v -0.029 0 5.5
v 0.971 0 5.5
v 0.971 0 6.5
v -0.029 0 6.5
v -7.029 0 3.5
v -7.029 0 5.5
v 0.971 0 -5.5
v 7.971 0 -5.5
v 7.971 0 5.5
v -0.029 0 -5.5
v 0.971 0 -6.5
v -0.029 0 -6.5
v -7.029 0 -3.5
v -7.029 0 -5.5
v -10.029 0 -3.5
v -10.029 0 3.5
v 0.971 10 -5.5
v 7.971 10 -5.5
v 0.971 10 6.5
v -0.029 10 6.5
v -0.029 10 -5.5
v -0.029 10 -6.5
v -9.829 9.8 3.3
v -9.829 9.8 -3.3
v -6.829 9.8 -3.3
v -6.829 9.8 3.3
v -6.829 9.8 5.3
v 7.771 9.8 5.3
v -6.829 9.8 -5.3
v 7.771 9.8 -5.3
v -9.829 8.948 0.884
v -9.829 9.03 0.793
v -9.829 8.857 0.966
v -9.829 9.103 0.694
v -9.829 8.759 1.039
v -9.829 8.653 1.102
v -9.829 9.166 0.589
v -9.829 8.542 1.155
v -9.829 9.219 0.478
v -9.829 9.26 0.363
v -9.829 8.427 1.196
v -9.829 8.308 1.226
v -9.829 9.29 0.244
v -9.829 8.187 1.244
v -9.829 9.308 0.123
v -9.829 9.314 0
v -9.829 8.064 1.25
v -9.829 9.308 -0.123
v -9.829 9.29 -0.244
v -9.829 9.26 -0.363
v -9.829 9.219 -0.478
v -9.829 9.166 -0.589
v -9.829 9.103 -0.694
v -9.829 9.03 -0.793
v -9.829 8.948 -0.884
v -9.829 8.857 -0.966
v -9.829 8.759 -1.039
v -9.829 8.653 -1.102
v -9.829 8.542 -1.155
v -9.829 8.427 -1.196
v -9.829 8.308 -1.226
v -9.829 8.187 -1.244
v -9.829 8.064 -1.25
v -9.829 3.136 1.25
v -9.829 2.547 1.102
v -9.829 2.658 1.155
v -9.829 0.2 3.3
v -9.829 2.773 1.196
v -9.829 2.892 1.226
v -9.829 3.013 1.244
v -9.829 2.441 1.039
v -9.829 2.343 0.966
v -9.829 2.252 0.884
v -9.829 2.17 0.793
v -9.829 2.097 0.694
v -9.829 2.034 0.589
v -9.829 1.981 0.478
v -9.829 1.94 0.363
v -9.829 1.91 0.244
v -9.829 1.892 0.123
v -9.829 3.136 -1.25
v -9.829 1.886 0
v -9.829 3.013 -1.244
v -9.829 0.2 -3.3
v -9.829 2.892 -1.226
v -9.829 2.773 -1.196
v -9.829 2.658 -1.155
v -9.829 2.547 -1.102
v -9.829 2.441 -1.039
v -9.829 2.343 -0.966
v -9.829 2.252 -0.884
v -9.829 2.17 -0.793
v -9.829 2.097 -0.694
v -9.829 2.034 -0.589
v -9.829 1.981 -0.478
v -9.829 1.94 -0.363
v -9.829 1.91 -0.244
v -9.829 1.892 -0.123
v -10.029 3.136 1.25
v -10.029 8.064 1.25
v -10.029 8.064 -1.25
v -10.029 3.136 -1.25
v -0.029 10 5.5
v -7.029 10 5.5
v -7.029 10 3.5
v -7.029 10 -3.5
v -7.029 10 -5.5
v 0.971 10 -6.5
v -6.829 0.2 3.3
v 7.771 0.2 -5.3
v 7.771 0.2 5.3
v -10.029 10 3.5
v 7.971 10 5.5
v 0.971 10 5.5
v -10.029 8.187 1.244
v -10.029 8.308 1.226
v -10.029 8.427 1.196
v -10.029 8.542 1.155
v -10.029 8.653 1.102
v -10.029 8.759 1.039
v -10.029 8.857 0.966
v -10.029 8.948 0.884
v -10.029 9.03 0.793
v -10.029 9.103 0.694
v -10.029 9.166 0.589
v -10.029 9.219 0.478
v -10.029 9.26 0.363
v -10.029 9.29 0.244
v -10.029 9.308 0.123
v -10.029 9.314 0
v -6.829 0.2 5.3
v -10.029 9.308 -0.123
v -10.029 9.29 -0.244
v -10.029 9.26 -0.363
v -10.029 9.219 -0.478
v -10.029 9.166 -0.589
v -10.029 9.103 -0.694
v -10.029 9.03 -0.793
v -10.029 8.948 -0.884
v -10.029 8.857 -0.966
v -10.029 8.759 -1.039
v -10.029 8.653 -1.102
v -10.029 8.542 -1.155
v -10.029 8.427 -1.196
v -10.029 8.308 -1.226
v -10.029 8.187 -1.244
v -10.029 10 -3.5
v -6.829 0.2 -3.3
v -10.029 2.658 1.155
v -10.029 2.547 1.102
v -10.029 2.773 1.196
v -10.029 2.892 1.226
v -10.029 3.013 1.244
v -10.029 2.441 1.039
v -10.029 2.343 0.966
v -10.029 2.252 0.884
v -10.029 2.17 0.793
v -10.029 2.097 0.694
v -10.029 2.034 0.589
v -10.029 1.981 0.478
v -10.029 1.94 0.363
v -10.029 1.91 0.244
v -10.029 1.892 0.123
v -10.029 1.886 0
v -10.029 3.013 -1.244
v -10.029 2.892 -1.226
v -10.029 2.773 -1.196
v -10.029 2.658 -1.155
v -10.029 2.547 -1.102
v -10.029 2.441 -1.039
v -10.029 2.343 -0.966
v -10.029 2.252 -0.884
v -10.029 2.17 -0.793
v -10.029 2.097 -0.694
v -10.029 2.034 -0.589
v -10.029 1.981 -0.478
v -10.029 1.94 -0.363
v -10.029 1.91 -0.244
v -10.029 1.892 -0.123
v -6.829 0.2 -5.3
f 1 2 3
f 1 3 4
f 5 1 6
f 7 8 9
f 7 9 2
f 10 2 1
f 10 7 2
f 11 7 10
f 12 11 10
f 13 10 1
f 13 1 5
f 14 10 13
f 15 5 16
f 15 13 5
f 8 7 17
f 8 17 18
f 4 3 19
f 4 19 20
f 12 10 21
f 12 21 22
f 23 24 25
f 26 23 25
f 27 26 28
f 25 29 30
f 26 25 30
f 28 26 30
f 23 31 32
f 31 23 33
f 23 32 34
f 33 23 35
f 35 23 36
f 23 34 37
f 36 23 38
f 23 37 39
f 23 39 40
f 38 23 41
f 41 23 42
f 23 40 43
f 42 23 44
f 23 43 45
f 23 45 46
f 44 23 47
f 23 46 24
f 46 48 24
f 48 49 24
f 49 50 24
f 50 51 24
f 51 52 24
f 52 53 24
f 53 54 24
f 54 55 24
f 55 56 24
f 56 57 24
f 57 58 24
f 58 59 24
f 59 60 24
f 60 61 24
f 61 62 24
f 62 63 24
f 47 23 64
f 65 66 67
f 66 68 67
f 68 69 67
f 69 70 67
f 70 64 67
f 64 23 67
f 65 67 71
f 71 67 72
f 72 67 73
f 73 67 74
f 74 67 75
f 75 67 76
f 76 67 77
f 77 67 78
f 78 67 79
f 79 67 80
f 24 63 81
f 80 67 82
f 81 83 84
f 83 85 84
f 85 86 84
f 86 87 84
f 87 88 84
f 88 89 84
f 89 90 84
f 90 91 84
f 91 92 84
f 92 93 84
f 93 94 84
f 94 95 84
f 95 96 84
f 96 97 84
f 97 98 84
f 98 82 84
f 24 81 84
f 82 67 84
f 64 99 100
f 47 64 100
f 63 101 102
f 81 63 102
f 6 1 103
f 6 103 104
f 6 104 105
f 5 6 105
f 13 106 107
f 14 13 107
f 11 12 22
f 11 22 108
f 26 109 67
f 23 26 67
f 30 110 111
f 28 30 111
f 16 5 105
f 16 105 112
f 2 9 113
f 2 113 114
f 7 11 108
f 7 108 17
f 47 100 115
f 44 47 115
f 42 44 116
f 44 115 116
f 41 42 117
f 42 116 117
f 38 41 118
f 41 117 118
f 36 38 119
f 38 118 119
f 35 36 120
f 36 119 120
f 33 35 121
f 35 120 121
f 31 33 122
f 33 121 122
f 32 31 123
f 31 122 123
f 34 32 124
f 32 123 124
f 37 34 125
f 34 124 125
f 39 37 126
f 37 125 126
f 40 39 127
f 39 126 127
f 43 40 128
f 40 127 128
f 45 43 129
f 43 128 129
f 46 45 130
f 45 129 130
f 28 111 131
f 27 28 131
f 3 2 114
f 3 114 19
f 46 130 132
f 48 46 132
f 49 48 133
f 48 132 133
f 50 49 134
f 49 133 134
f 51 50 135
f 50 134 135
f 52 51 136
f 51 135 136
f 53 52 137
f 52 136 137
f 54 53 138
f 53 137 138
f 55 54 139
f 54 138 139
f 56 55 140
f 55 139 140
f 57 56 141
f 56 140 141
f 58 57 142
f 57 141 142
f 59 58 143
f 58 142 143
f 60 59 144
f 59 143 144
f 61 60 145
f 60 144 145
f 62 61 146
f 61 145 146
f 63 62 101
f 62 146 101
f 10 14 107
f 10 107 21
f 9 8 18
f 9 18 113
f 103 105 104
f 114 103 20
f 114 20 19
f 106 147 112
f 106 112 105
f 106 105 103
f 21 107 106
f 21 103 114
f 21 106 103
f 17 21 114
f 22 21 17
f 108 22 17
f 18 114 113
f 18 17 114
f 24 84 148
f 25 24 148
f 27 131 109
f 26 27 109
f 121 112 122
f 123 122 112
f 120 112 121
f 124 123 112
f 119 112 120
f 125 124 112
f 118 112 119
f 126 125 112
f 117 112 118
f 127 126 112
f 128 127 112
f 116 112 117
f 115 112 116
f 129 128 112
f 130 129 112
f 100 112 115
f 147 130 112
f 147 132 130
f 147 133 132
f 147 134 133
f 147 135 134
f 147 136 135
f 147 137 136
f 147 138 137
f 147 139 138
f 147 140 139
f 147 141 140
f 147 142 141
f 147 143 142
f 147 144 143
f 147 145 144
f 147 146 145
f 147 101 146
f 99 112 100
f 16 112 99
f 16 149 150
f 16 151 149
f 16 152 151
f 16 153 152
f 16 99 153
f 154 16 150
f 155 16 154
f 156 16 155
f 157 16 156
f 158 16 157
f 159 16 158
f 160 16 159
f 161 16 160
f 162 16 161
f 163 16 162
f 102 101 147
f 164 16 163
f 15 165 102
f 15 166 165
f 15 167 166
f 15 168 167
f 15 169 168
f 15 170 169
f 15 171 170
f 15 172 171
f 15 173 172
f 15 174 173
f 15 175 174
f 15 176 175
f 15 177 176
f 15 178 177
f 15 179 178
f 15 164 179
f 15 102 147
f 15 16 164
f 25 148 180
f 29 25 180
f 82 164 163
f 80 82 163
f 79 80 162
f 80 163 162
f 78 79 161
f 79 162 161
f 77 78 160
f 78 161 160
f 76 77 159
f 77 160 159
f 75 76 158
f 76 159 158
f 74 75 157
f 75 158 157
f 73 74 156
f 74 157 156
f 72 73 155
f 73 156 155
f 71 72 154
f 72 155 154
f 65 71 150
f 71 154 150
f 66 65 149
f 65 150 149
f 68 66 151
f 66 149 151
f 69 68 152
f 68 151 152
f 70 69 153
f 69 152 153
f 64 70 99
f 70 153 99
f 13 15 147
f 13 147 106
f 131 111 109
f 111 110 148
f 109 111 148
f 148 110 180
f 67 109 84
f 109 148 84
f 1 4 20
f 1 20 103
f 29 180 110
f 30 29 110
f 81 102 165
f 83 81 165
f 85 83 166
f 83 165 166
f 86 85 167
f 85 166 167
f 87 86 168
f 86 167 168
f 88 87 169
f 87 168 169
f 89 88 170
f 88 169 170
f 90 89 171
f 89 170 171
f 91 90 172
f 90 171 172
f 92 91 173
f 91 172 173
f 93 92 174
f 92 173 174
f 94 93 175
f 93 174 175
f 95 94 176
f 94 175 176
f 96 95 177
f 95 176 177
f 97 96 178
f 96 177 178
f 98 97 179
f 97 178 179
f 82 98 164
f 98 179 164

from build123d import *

# Parameters (mm, degrees)
BOSS_EXTRUDE1_DEPTH = 10
SKETCH6_W           = 14.6
SKETCH6_H           = 10.6
SKETCH6_W_2         = 3
SKETCH6_H_2         = 6.6
BOSS_EXTRUDE4_DEPTH = 0.2
SKETCH7_W           = 14.6
SKETCH7_H           = 10.6
SKETCH7_W_2         = 3
SKETCH7_H_2         = 6.6
BOSS_EXTRUDE5_DEPTH = 0.2
CUT_EXTRUDE3_DEPTH  = 0.5


with BuildPart() as part:
    # Sketch1 → Boss-Extrude1 (new body)
    with BuildSketch(Plane(origin=(0, 0, 0), x_dir=(1, 0, 0), z_dir=(0, 1, 0))):
        Polygon((-10.028718685, -3.5), (-10.028718685, 3.5), (-7.028718685, 3.5), (-7.028718685, 5.5), (-0.028718685, 5.5), (-0.028718685, 6.5), (0.971281315, 6.5), (0.971281315, 5.5), (7.971281315, 5.5), (7.971281315, -5.5), (0.971281315, -5.5), (0.971281315, -6.5), (-0.028718685, -6.5), (-0.028718685, -5.5), (-7.028718685, -5.5), (-7.028718685, -3.5), align=None)
        Polygon((-9.828718685, 3.3), (-6.828718685, 3.3), (-6.828718685, 5.3), (0.171281315, 5.3), (0.771281315, 5.3), (7.771281315, 5.3), (7.771281315, -5.3), (0.771281315, -5.3), (0.171281315, -5.3), (-6.828718685, -5.3), (-6.828718685, -3.3), (-9.828718685, -3.3), align=None, mode=Mode.SUBTRACT)
    extrude(amount=BOSS_EXTRUDE1_DEPTH)

    # Sketch6 → Boss-Extrude4 (add)
    with BuildSketch(Plane(origin=(0, 0, 0), x_dir=(-1, 0, 0), z_dir=(0, -1, 0))):
        with Locations((-0.471281315, 0)):
            Rectangle(SKETCH6_W, SKETCH6_H)
        with Locations((8.328718685, 0)):
            Rectangle(SKETCH6_W_2, SKETCH6_H_2)
    extrude(amount=-BOSS_EXTRUDE4_DEPTH)

    # Sketch7 → Boss-Extrude5 (add)
    with BuildSketch(Plane(origin=(0, 10, 0), x_dir=(1, 0, 0), z_dir=(0, 1, 0))):
        with Locations((0.471281315, 0)):
            Rectangle(SKETCH7_W, SKETCH7_H)
        with Locations((-8.328718685, 0)):
            Rectangle(SKETCH7_W_2, SKETCH7_H_2)
    extrude(amount=-BOSS_EXTRUDE5_DEPTH)

    # Sketch8 → Cut-Extrude3 (cut)
    with BuildSketch(Plane.ZY.offset(10.028718685)):
        with BuildLine():
            Line((0, 9.314071319), (0, 5))
            Line((0, 5), (1.25, 5))
            Line((1.25, 5), (1.25, 8.064071319))
            ThreePointArc((1.25, 8.064071319), (0.883883476, 8.947954796), (0, 9.314071319))
        make_face()
        with BuildLine():
            Line((-1.25, 5), (0, 5))
            Line((0, 5), (0, 9.314071319))
            ThreePointArc((0, 9.314071319), (-0.883883476, 8.947954796), (-1.25, 8.064071319))
            Line((-1.25, 8.064071319), (-1.25, 5))
        make_face()
        with BuildLine():
            ThreePointArc((-1.25, 3.135928681), (-0.883883476, 2.252045204), (0, 1.885928681))
            Line((0, 1.885928681), (0, 5))
            Line((0, 5), (-1.25, 5))
            Line((-1.25, 5), (-1.25, 3.135928681))
        make_face()
        with BuildLine():
            Line((0, 5), (0, 1.885928681))
            ThreePointArc((0, 1.885928681), (0.883883476, 2.252045204), (1.25, 3.135928681))
            Line((1.25, 3.135928681), (1.25, 5))
            Line((1.25, 5), (0, 5))
        make_face()
    extrude(amount=-CUT_EXTRUDE3_DEPTH, mode=Mode.SUBTRACT)


solid = part.part
